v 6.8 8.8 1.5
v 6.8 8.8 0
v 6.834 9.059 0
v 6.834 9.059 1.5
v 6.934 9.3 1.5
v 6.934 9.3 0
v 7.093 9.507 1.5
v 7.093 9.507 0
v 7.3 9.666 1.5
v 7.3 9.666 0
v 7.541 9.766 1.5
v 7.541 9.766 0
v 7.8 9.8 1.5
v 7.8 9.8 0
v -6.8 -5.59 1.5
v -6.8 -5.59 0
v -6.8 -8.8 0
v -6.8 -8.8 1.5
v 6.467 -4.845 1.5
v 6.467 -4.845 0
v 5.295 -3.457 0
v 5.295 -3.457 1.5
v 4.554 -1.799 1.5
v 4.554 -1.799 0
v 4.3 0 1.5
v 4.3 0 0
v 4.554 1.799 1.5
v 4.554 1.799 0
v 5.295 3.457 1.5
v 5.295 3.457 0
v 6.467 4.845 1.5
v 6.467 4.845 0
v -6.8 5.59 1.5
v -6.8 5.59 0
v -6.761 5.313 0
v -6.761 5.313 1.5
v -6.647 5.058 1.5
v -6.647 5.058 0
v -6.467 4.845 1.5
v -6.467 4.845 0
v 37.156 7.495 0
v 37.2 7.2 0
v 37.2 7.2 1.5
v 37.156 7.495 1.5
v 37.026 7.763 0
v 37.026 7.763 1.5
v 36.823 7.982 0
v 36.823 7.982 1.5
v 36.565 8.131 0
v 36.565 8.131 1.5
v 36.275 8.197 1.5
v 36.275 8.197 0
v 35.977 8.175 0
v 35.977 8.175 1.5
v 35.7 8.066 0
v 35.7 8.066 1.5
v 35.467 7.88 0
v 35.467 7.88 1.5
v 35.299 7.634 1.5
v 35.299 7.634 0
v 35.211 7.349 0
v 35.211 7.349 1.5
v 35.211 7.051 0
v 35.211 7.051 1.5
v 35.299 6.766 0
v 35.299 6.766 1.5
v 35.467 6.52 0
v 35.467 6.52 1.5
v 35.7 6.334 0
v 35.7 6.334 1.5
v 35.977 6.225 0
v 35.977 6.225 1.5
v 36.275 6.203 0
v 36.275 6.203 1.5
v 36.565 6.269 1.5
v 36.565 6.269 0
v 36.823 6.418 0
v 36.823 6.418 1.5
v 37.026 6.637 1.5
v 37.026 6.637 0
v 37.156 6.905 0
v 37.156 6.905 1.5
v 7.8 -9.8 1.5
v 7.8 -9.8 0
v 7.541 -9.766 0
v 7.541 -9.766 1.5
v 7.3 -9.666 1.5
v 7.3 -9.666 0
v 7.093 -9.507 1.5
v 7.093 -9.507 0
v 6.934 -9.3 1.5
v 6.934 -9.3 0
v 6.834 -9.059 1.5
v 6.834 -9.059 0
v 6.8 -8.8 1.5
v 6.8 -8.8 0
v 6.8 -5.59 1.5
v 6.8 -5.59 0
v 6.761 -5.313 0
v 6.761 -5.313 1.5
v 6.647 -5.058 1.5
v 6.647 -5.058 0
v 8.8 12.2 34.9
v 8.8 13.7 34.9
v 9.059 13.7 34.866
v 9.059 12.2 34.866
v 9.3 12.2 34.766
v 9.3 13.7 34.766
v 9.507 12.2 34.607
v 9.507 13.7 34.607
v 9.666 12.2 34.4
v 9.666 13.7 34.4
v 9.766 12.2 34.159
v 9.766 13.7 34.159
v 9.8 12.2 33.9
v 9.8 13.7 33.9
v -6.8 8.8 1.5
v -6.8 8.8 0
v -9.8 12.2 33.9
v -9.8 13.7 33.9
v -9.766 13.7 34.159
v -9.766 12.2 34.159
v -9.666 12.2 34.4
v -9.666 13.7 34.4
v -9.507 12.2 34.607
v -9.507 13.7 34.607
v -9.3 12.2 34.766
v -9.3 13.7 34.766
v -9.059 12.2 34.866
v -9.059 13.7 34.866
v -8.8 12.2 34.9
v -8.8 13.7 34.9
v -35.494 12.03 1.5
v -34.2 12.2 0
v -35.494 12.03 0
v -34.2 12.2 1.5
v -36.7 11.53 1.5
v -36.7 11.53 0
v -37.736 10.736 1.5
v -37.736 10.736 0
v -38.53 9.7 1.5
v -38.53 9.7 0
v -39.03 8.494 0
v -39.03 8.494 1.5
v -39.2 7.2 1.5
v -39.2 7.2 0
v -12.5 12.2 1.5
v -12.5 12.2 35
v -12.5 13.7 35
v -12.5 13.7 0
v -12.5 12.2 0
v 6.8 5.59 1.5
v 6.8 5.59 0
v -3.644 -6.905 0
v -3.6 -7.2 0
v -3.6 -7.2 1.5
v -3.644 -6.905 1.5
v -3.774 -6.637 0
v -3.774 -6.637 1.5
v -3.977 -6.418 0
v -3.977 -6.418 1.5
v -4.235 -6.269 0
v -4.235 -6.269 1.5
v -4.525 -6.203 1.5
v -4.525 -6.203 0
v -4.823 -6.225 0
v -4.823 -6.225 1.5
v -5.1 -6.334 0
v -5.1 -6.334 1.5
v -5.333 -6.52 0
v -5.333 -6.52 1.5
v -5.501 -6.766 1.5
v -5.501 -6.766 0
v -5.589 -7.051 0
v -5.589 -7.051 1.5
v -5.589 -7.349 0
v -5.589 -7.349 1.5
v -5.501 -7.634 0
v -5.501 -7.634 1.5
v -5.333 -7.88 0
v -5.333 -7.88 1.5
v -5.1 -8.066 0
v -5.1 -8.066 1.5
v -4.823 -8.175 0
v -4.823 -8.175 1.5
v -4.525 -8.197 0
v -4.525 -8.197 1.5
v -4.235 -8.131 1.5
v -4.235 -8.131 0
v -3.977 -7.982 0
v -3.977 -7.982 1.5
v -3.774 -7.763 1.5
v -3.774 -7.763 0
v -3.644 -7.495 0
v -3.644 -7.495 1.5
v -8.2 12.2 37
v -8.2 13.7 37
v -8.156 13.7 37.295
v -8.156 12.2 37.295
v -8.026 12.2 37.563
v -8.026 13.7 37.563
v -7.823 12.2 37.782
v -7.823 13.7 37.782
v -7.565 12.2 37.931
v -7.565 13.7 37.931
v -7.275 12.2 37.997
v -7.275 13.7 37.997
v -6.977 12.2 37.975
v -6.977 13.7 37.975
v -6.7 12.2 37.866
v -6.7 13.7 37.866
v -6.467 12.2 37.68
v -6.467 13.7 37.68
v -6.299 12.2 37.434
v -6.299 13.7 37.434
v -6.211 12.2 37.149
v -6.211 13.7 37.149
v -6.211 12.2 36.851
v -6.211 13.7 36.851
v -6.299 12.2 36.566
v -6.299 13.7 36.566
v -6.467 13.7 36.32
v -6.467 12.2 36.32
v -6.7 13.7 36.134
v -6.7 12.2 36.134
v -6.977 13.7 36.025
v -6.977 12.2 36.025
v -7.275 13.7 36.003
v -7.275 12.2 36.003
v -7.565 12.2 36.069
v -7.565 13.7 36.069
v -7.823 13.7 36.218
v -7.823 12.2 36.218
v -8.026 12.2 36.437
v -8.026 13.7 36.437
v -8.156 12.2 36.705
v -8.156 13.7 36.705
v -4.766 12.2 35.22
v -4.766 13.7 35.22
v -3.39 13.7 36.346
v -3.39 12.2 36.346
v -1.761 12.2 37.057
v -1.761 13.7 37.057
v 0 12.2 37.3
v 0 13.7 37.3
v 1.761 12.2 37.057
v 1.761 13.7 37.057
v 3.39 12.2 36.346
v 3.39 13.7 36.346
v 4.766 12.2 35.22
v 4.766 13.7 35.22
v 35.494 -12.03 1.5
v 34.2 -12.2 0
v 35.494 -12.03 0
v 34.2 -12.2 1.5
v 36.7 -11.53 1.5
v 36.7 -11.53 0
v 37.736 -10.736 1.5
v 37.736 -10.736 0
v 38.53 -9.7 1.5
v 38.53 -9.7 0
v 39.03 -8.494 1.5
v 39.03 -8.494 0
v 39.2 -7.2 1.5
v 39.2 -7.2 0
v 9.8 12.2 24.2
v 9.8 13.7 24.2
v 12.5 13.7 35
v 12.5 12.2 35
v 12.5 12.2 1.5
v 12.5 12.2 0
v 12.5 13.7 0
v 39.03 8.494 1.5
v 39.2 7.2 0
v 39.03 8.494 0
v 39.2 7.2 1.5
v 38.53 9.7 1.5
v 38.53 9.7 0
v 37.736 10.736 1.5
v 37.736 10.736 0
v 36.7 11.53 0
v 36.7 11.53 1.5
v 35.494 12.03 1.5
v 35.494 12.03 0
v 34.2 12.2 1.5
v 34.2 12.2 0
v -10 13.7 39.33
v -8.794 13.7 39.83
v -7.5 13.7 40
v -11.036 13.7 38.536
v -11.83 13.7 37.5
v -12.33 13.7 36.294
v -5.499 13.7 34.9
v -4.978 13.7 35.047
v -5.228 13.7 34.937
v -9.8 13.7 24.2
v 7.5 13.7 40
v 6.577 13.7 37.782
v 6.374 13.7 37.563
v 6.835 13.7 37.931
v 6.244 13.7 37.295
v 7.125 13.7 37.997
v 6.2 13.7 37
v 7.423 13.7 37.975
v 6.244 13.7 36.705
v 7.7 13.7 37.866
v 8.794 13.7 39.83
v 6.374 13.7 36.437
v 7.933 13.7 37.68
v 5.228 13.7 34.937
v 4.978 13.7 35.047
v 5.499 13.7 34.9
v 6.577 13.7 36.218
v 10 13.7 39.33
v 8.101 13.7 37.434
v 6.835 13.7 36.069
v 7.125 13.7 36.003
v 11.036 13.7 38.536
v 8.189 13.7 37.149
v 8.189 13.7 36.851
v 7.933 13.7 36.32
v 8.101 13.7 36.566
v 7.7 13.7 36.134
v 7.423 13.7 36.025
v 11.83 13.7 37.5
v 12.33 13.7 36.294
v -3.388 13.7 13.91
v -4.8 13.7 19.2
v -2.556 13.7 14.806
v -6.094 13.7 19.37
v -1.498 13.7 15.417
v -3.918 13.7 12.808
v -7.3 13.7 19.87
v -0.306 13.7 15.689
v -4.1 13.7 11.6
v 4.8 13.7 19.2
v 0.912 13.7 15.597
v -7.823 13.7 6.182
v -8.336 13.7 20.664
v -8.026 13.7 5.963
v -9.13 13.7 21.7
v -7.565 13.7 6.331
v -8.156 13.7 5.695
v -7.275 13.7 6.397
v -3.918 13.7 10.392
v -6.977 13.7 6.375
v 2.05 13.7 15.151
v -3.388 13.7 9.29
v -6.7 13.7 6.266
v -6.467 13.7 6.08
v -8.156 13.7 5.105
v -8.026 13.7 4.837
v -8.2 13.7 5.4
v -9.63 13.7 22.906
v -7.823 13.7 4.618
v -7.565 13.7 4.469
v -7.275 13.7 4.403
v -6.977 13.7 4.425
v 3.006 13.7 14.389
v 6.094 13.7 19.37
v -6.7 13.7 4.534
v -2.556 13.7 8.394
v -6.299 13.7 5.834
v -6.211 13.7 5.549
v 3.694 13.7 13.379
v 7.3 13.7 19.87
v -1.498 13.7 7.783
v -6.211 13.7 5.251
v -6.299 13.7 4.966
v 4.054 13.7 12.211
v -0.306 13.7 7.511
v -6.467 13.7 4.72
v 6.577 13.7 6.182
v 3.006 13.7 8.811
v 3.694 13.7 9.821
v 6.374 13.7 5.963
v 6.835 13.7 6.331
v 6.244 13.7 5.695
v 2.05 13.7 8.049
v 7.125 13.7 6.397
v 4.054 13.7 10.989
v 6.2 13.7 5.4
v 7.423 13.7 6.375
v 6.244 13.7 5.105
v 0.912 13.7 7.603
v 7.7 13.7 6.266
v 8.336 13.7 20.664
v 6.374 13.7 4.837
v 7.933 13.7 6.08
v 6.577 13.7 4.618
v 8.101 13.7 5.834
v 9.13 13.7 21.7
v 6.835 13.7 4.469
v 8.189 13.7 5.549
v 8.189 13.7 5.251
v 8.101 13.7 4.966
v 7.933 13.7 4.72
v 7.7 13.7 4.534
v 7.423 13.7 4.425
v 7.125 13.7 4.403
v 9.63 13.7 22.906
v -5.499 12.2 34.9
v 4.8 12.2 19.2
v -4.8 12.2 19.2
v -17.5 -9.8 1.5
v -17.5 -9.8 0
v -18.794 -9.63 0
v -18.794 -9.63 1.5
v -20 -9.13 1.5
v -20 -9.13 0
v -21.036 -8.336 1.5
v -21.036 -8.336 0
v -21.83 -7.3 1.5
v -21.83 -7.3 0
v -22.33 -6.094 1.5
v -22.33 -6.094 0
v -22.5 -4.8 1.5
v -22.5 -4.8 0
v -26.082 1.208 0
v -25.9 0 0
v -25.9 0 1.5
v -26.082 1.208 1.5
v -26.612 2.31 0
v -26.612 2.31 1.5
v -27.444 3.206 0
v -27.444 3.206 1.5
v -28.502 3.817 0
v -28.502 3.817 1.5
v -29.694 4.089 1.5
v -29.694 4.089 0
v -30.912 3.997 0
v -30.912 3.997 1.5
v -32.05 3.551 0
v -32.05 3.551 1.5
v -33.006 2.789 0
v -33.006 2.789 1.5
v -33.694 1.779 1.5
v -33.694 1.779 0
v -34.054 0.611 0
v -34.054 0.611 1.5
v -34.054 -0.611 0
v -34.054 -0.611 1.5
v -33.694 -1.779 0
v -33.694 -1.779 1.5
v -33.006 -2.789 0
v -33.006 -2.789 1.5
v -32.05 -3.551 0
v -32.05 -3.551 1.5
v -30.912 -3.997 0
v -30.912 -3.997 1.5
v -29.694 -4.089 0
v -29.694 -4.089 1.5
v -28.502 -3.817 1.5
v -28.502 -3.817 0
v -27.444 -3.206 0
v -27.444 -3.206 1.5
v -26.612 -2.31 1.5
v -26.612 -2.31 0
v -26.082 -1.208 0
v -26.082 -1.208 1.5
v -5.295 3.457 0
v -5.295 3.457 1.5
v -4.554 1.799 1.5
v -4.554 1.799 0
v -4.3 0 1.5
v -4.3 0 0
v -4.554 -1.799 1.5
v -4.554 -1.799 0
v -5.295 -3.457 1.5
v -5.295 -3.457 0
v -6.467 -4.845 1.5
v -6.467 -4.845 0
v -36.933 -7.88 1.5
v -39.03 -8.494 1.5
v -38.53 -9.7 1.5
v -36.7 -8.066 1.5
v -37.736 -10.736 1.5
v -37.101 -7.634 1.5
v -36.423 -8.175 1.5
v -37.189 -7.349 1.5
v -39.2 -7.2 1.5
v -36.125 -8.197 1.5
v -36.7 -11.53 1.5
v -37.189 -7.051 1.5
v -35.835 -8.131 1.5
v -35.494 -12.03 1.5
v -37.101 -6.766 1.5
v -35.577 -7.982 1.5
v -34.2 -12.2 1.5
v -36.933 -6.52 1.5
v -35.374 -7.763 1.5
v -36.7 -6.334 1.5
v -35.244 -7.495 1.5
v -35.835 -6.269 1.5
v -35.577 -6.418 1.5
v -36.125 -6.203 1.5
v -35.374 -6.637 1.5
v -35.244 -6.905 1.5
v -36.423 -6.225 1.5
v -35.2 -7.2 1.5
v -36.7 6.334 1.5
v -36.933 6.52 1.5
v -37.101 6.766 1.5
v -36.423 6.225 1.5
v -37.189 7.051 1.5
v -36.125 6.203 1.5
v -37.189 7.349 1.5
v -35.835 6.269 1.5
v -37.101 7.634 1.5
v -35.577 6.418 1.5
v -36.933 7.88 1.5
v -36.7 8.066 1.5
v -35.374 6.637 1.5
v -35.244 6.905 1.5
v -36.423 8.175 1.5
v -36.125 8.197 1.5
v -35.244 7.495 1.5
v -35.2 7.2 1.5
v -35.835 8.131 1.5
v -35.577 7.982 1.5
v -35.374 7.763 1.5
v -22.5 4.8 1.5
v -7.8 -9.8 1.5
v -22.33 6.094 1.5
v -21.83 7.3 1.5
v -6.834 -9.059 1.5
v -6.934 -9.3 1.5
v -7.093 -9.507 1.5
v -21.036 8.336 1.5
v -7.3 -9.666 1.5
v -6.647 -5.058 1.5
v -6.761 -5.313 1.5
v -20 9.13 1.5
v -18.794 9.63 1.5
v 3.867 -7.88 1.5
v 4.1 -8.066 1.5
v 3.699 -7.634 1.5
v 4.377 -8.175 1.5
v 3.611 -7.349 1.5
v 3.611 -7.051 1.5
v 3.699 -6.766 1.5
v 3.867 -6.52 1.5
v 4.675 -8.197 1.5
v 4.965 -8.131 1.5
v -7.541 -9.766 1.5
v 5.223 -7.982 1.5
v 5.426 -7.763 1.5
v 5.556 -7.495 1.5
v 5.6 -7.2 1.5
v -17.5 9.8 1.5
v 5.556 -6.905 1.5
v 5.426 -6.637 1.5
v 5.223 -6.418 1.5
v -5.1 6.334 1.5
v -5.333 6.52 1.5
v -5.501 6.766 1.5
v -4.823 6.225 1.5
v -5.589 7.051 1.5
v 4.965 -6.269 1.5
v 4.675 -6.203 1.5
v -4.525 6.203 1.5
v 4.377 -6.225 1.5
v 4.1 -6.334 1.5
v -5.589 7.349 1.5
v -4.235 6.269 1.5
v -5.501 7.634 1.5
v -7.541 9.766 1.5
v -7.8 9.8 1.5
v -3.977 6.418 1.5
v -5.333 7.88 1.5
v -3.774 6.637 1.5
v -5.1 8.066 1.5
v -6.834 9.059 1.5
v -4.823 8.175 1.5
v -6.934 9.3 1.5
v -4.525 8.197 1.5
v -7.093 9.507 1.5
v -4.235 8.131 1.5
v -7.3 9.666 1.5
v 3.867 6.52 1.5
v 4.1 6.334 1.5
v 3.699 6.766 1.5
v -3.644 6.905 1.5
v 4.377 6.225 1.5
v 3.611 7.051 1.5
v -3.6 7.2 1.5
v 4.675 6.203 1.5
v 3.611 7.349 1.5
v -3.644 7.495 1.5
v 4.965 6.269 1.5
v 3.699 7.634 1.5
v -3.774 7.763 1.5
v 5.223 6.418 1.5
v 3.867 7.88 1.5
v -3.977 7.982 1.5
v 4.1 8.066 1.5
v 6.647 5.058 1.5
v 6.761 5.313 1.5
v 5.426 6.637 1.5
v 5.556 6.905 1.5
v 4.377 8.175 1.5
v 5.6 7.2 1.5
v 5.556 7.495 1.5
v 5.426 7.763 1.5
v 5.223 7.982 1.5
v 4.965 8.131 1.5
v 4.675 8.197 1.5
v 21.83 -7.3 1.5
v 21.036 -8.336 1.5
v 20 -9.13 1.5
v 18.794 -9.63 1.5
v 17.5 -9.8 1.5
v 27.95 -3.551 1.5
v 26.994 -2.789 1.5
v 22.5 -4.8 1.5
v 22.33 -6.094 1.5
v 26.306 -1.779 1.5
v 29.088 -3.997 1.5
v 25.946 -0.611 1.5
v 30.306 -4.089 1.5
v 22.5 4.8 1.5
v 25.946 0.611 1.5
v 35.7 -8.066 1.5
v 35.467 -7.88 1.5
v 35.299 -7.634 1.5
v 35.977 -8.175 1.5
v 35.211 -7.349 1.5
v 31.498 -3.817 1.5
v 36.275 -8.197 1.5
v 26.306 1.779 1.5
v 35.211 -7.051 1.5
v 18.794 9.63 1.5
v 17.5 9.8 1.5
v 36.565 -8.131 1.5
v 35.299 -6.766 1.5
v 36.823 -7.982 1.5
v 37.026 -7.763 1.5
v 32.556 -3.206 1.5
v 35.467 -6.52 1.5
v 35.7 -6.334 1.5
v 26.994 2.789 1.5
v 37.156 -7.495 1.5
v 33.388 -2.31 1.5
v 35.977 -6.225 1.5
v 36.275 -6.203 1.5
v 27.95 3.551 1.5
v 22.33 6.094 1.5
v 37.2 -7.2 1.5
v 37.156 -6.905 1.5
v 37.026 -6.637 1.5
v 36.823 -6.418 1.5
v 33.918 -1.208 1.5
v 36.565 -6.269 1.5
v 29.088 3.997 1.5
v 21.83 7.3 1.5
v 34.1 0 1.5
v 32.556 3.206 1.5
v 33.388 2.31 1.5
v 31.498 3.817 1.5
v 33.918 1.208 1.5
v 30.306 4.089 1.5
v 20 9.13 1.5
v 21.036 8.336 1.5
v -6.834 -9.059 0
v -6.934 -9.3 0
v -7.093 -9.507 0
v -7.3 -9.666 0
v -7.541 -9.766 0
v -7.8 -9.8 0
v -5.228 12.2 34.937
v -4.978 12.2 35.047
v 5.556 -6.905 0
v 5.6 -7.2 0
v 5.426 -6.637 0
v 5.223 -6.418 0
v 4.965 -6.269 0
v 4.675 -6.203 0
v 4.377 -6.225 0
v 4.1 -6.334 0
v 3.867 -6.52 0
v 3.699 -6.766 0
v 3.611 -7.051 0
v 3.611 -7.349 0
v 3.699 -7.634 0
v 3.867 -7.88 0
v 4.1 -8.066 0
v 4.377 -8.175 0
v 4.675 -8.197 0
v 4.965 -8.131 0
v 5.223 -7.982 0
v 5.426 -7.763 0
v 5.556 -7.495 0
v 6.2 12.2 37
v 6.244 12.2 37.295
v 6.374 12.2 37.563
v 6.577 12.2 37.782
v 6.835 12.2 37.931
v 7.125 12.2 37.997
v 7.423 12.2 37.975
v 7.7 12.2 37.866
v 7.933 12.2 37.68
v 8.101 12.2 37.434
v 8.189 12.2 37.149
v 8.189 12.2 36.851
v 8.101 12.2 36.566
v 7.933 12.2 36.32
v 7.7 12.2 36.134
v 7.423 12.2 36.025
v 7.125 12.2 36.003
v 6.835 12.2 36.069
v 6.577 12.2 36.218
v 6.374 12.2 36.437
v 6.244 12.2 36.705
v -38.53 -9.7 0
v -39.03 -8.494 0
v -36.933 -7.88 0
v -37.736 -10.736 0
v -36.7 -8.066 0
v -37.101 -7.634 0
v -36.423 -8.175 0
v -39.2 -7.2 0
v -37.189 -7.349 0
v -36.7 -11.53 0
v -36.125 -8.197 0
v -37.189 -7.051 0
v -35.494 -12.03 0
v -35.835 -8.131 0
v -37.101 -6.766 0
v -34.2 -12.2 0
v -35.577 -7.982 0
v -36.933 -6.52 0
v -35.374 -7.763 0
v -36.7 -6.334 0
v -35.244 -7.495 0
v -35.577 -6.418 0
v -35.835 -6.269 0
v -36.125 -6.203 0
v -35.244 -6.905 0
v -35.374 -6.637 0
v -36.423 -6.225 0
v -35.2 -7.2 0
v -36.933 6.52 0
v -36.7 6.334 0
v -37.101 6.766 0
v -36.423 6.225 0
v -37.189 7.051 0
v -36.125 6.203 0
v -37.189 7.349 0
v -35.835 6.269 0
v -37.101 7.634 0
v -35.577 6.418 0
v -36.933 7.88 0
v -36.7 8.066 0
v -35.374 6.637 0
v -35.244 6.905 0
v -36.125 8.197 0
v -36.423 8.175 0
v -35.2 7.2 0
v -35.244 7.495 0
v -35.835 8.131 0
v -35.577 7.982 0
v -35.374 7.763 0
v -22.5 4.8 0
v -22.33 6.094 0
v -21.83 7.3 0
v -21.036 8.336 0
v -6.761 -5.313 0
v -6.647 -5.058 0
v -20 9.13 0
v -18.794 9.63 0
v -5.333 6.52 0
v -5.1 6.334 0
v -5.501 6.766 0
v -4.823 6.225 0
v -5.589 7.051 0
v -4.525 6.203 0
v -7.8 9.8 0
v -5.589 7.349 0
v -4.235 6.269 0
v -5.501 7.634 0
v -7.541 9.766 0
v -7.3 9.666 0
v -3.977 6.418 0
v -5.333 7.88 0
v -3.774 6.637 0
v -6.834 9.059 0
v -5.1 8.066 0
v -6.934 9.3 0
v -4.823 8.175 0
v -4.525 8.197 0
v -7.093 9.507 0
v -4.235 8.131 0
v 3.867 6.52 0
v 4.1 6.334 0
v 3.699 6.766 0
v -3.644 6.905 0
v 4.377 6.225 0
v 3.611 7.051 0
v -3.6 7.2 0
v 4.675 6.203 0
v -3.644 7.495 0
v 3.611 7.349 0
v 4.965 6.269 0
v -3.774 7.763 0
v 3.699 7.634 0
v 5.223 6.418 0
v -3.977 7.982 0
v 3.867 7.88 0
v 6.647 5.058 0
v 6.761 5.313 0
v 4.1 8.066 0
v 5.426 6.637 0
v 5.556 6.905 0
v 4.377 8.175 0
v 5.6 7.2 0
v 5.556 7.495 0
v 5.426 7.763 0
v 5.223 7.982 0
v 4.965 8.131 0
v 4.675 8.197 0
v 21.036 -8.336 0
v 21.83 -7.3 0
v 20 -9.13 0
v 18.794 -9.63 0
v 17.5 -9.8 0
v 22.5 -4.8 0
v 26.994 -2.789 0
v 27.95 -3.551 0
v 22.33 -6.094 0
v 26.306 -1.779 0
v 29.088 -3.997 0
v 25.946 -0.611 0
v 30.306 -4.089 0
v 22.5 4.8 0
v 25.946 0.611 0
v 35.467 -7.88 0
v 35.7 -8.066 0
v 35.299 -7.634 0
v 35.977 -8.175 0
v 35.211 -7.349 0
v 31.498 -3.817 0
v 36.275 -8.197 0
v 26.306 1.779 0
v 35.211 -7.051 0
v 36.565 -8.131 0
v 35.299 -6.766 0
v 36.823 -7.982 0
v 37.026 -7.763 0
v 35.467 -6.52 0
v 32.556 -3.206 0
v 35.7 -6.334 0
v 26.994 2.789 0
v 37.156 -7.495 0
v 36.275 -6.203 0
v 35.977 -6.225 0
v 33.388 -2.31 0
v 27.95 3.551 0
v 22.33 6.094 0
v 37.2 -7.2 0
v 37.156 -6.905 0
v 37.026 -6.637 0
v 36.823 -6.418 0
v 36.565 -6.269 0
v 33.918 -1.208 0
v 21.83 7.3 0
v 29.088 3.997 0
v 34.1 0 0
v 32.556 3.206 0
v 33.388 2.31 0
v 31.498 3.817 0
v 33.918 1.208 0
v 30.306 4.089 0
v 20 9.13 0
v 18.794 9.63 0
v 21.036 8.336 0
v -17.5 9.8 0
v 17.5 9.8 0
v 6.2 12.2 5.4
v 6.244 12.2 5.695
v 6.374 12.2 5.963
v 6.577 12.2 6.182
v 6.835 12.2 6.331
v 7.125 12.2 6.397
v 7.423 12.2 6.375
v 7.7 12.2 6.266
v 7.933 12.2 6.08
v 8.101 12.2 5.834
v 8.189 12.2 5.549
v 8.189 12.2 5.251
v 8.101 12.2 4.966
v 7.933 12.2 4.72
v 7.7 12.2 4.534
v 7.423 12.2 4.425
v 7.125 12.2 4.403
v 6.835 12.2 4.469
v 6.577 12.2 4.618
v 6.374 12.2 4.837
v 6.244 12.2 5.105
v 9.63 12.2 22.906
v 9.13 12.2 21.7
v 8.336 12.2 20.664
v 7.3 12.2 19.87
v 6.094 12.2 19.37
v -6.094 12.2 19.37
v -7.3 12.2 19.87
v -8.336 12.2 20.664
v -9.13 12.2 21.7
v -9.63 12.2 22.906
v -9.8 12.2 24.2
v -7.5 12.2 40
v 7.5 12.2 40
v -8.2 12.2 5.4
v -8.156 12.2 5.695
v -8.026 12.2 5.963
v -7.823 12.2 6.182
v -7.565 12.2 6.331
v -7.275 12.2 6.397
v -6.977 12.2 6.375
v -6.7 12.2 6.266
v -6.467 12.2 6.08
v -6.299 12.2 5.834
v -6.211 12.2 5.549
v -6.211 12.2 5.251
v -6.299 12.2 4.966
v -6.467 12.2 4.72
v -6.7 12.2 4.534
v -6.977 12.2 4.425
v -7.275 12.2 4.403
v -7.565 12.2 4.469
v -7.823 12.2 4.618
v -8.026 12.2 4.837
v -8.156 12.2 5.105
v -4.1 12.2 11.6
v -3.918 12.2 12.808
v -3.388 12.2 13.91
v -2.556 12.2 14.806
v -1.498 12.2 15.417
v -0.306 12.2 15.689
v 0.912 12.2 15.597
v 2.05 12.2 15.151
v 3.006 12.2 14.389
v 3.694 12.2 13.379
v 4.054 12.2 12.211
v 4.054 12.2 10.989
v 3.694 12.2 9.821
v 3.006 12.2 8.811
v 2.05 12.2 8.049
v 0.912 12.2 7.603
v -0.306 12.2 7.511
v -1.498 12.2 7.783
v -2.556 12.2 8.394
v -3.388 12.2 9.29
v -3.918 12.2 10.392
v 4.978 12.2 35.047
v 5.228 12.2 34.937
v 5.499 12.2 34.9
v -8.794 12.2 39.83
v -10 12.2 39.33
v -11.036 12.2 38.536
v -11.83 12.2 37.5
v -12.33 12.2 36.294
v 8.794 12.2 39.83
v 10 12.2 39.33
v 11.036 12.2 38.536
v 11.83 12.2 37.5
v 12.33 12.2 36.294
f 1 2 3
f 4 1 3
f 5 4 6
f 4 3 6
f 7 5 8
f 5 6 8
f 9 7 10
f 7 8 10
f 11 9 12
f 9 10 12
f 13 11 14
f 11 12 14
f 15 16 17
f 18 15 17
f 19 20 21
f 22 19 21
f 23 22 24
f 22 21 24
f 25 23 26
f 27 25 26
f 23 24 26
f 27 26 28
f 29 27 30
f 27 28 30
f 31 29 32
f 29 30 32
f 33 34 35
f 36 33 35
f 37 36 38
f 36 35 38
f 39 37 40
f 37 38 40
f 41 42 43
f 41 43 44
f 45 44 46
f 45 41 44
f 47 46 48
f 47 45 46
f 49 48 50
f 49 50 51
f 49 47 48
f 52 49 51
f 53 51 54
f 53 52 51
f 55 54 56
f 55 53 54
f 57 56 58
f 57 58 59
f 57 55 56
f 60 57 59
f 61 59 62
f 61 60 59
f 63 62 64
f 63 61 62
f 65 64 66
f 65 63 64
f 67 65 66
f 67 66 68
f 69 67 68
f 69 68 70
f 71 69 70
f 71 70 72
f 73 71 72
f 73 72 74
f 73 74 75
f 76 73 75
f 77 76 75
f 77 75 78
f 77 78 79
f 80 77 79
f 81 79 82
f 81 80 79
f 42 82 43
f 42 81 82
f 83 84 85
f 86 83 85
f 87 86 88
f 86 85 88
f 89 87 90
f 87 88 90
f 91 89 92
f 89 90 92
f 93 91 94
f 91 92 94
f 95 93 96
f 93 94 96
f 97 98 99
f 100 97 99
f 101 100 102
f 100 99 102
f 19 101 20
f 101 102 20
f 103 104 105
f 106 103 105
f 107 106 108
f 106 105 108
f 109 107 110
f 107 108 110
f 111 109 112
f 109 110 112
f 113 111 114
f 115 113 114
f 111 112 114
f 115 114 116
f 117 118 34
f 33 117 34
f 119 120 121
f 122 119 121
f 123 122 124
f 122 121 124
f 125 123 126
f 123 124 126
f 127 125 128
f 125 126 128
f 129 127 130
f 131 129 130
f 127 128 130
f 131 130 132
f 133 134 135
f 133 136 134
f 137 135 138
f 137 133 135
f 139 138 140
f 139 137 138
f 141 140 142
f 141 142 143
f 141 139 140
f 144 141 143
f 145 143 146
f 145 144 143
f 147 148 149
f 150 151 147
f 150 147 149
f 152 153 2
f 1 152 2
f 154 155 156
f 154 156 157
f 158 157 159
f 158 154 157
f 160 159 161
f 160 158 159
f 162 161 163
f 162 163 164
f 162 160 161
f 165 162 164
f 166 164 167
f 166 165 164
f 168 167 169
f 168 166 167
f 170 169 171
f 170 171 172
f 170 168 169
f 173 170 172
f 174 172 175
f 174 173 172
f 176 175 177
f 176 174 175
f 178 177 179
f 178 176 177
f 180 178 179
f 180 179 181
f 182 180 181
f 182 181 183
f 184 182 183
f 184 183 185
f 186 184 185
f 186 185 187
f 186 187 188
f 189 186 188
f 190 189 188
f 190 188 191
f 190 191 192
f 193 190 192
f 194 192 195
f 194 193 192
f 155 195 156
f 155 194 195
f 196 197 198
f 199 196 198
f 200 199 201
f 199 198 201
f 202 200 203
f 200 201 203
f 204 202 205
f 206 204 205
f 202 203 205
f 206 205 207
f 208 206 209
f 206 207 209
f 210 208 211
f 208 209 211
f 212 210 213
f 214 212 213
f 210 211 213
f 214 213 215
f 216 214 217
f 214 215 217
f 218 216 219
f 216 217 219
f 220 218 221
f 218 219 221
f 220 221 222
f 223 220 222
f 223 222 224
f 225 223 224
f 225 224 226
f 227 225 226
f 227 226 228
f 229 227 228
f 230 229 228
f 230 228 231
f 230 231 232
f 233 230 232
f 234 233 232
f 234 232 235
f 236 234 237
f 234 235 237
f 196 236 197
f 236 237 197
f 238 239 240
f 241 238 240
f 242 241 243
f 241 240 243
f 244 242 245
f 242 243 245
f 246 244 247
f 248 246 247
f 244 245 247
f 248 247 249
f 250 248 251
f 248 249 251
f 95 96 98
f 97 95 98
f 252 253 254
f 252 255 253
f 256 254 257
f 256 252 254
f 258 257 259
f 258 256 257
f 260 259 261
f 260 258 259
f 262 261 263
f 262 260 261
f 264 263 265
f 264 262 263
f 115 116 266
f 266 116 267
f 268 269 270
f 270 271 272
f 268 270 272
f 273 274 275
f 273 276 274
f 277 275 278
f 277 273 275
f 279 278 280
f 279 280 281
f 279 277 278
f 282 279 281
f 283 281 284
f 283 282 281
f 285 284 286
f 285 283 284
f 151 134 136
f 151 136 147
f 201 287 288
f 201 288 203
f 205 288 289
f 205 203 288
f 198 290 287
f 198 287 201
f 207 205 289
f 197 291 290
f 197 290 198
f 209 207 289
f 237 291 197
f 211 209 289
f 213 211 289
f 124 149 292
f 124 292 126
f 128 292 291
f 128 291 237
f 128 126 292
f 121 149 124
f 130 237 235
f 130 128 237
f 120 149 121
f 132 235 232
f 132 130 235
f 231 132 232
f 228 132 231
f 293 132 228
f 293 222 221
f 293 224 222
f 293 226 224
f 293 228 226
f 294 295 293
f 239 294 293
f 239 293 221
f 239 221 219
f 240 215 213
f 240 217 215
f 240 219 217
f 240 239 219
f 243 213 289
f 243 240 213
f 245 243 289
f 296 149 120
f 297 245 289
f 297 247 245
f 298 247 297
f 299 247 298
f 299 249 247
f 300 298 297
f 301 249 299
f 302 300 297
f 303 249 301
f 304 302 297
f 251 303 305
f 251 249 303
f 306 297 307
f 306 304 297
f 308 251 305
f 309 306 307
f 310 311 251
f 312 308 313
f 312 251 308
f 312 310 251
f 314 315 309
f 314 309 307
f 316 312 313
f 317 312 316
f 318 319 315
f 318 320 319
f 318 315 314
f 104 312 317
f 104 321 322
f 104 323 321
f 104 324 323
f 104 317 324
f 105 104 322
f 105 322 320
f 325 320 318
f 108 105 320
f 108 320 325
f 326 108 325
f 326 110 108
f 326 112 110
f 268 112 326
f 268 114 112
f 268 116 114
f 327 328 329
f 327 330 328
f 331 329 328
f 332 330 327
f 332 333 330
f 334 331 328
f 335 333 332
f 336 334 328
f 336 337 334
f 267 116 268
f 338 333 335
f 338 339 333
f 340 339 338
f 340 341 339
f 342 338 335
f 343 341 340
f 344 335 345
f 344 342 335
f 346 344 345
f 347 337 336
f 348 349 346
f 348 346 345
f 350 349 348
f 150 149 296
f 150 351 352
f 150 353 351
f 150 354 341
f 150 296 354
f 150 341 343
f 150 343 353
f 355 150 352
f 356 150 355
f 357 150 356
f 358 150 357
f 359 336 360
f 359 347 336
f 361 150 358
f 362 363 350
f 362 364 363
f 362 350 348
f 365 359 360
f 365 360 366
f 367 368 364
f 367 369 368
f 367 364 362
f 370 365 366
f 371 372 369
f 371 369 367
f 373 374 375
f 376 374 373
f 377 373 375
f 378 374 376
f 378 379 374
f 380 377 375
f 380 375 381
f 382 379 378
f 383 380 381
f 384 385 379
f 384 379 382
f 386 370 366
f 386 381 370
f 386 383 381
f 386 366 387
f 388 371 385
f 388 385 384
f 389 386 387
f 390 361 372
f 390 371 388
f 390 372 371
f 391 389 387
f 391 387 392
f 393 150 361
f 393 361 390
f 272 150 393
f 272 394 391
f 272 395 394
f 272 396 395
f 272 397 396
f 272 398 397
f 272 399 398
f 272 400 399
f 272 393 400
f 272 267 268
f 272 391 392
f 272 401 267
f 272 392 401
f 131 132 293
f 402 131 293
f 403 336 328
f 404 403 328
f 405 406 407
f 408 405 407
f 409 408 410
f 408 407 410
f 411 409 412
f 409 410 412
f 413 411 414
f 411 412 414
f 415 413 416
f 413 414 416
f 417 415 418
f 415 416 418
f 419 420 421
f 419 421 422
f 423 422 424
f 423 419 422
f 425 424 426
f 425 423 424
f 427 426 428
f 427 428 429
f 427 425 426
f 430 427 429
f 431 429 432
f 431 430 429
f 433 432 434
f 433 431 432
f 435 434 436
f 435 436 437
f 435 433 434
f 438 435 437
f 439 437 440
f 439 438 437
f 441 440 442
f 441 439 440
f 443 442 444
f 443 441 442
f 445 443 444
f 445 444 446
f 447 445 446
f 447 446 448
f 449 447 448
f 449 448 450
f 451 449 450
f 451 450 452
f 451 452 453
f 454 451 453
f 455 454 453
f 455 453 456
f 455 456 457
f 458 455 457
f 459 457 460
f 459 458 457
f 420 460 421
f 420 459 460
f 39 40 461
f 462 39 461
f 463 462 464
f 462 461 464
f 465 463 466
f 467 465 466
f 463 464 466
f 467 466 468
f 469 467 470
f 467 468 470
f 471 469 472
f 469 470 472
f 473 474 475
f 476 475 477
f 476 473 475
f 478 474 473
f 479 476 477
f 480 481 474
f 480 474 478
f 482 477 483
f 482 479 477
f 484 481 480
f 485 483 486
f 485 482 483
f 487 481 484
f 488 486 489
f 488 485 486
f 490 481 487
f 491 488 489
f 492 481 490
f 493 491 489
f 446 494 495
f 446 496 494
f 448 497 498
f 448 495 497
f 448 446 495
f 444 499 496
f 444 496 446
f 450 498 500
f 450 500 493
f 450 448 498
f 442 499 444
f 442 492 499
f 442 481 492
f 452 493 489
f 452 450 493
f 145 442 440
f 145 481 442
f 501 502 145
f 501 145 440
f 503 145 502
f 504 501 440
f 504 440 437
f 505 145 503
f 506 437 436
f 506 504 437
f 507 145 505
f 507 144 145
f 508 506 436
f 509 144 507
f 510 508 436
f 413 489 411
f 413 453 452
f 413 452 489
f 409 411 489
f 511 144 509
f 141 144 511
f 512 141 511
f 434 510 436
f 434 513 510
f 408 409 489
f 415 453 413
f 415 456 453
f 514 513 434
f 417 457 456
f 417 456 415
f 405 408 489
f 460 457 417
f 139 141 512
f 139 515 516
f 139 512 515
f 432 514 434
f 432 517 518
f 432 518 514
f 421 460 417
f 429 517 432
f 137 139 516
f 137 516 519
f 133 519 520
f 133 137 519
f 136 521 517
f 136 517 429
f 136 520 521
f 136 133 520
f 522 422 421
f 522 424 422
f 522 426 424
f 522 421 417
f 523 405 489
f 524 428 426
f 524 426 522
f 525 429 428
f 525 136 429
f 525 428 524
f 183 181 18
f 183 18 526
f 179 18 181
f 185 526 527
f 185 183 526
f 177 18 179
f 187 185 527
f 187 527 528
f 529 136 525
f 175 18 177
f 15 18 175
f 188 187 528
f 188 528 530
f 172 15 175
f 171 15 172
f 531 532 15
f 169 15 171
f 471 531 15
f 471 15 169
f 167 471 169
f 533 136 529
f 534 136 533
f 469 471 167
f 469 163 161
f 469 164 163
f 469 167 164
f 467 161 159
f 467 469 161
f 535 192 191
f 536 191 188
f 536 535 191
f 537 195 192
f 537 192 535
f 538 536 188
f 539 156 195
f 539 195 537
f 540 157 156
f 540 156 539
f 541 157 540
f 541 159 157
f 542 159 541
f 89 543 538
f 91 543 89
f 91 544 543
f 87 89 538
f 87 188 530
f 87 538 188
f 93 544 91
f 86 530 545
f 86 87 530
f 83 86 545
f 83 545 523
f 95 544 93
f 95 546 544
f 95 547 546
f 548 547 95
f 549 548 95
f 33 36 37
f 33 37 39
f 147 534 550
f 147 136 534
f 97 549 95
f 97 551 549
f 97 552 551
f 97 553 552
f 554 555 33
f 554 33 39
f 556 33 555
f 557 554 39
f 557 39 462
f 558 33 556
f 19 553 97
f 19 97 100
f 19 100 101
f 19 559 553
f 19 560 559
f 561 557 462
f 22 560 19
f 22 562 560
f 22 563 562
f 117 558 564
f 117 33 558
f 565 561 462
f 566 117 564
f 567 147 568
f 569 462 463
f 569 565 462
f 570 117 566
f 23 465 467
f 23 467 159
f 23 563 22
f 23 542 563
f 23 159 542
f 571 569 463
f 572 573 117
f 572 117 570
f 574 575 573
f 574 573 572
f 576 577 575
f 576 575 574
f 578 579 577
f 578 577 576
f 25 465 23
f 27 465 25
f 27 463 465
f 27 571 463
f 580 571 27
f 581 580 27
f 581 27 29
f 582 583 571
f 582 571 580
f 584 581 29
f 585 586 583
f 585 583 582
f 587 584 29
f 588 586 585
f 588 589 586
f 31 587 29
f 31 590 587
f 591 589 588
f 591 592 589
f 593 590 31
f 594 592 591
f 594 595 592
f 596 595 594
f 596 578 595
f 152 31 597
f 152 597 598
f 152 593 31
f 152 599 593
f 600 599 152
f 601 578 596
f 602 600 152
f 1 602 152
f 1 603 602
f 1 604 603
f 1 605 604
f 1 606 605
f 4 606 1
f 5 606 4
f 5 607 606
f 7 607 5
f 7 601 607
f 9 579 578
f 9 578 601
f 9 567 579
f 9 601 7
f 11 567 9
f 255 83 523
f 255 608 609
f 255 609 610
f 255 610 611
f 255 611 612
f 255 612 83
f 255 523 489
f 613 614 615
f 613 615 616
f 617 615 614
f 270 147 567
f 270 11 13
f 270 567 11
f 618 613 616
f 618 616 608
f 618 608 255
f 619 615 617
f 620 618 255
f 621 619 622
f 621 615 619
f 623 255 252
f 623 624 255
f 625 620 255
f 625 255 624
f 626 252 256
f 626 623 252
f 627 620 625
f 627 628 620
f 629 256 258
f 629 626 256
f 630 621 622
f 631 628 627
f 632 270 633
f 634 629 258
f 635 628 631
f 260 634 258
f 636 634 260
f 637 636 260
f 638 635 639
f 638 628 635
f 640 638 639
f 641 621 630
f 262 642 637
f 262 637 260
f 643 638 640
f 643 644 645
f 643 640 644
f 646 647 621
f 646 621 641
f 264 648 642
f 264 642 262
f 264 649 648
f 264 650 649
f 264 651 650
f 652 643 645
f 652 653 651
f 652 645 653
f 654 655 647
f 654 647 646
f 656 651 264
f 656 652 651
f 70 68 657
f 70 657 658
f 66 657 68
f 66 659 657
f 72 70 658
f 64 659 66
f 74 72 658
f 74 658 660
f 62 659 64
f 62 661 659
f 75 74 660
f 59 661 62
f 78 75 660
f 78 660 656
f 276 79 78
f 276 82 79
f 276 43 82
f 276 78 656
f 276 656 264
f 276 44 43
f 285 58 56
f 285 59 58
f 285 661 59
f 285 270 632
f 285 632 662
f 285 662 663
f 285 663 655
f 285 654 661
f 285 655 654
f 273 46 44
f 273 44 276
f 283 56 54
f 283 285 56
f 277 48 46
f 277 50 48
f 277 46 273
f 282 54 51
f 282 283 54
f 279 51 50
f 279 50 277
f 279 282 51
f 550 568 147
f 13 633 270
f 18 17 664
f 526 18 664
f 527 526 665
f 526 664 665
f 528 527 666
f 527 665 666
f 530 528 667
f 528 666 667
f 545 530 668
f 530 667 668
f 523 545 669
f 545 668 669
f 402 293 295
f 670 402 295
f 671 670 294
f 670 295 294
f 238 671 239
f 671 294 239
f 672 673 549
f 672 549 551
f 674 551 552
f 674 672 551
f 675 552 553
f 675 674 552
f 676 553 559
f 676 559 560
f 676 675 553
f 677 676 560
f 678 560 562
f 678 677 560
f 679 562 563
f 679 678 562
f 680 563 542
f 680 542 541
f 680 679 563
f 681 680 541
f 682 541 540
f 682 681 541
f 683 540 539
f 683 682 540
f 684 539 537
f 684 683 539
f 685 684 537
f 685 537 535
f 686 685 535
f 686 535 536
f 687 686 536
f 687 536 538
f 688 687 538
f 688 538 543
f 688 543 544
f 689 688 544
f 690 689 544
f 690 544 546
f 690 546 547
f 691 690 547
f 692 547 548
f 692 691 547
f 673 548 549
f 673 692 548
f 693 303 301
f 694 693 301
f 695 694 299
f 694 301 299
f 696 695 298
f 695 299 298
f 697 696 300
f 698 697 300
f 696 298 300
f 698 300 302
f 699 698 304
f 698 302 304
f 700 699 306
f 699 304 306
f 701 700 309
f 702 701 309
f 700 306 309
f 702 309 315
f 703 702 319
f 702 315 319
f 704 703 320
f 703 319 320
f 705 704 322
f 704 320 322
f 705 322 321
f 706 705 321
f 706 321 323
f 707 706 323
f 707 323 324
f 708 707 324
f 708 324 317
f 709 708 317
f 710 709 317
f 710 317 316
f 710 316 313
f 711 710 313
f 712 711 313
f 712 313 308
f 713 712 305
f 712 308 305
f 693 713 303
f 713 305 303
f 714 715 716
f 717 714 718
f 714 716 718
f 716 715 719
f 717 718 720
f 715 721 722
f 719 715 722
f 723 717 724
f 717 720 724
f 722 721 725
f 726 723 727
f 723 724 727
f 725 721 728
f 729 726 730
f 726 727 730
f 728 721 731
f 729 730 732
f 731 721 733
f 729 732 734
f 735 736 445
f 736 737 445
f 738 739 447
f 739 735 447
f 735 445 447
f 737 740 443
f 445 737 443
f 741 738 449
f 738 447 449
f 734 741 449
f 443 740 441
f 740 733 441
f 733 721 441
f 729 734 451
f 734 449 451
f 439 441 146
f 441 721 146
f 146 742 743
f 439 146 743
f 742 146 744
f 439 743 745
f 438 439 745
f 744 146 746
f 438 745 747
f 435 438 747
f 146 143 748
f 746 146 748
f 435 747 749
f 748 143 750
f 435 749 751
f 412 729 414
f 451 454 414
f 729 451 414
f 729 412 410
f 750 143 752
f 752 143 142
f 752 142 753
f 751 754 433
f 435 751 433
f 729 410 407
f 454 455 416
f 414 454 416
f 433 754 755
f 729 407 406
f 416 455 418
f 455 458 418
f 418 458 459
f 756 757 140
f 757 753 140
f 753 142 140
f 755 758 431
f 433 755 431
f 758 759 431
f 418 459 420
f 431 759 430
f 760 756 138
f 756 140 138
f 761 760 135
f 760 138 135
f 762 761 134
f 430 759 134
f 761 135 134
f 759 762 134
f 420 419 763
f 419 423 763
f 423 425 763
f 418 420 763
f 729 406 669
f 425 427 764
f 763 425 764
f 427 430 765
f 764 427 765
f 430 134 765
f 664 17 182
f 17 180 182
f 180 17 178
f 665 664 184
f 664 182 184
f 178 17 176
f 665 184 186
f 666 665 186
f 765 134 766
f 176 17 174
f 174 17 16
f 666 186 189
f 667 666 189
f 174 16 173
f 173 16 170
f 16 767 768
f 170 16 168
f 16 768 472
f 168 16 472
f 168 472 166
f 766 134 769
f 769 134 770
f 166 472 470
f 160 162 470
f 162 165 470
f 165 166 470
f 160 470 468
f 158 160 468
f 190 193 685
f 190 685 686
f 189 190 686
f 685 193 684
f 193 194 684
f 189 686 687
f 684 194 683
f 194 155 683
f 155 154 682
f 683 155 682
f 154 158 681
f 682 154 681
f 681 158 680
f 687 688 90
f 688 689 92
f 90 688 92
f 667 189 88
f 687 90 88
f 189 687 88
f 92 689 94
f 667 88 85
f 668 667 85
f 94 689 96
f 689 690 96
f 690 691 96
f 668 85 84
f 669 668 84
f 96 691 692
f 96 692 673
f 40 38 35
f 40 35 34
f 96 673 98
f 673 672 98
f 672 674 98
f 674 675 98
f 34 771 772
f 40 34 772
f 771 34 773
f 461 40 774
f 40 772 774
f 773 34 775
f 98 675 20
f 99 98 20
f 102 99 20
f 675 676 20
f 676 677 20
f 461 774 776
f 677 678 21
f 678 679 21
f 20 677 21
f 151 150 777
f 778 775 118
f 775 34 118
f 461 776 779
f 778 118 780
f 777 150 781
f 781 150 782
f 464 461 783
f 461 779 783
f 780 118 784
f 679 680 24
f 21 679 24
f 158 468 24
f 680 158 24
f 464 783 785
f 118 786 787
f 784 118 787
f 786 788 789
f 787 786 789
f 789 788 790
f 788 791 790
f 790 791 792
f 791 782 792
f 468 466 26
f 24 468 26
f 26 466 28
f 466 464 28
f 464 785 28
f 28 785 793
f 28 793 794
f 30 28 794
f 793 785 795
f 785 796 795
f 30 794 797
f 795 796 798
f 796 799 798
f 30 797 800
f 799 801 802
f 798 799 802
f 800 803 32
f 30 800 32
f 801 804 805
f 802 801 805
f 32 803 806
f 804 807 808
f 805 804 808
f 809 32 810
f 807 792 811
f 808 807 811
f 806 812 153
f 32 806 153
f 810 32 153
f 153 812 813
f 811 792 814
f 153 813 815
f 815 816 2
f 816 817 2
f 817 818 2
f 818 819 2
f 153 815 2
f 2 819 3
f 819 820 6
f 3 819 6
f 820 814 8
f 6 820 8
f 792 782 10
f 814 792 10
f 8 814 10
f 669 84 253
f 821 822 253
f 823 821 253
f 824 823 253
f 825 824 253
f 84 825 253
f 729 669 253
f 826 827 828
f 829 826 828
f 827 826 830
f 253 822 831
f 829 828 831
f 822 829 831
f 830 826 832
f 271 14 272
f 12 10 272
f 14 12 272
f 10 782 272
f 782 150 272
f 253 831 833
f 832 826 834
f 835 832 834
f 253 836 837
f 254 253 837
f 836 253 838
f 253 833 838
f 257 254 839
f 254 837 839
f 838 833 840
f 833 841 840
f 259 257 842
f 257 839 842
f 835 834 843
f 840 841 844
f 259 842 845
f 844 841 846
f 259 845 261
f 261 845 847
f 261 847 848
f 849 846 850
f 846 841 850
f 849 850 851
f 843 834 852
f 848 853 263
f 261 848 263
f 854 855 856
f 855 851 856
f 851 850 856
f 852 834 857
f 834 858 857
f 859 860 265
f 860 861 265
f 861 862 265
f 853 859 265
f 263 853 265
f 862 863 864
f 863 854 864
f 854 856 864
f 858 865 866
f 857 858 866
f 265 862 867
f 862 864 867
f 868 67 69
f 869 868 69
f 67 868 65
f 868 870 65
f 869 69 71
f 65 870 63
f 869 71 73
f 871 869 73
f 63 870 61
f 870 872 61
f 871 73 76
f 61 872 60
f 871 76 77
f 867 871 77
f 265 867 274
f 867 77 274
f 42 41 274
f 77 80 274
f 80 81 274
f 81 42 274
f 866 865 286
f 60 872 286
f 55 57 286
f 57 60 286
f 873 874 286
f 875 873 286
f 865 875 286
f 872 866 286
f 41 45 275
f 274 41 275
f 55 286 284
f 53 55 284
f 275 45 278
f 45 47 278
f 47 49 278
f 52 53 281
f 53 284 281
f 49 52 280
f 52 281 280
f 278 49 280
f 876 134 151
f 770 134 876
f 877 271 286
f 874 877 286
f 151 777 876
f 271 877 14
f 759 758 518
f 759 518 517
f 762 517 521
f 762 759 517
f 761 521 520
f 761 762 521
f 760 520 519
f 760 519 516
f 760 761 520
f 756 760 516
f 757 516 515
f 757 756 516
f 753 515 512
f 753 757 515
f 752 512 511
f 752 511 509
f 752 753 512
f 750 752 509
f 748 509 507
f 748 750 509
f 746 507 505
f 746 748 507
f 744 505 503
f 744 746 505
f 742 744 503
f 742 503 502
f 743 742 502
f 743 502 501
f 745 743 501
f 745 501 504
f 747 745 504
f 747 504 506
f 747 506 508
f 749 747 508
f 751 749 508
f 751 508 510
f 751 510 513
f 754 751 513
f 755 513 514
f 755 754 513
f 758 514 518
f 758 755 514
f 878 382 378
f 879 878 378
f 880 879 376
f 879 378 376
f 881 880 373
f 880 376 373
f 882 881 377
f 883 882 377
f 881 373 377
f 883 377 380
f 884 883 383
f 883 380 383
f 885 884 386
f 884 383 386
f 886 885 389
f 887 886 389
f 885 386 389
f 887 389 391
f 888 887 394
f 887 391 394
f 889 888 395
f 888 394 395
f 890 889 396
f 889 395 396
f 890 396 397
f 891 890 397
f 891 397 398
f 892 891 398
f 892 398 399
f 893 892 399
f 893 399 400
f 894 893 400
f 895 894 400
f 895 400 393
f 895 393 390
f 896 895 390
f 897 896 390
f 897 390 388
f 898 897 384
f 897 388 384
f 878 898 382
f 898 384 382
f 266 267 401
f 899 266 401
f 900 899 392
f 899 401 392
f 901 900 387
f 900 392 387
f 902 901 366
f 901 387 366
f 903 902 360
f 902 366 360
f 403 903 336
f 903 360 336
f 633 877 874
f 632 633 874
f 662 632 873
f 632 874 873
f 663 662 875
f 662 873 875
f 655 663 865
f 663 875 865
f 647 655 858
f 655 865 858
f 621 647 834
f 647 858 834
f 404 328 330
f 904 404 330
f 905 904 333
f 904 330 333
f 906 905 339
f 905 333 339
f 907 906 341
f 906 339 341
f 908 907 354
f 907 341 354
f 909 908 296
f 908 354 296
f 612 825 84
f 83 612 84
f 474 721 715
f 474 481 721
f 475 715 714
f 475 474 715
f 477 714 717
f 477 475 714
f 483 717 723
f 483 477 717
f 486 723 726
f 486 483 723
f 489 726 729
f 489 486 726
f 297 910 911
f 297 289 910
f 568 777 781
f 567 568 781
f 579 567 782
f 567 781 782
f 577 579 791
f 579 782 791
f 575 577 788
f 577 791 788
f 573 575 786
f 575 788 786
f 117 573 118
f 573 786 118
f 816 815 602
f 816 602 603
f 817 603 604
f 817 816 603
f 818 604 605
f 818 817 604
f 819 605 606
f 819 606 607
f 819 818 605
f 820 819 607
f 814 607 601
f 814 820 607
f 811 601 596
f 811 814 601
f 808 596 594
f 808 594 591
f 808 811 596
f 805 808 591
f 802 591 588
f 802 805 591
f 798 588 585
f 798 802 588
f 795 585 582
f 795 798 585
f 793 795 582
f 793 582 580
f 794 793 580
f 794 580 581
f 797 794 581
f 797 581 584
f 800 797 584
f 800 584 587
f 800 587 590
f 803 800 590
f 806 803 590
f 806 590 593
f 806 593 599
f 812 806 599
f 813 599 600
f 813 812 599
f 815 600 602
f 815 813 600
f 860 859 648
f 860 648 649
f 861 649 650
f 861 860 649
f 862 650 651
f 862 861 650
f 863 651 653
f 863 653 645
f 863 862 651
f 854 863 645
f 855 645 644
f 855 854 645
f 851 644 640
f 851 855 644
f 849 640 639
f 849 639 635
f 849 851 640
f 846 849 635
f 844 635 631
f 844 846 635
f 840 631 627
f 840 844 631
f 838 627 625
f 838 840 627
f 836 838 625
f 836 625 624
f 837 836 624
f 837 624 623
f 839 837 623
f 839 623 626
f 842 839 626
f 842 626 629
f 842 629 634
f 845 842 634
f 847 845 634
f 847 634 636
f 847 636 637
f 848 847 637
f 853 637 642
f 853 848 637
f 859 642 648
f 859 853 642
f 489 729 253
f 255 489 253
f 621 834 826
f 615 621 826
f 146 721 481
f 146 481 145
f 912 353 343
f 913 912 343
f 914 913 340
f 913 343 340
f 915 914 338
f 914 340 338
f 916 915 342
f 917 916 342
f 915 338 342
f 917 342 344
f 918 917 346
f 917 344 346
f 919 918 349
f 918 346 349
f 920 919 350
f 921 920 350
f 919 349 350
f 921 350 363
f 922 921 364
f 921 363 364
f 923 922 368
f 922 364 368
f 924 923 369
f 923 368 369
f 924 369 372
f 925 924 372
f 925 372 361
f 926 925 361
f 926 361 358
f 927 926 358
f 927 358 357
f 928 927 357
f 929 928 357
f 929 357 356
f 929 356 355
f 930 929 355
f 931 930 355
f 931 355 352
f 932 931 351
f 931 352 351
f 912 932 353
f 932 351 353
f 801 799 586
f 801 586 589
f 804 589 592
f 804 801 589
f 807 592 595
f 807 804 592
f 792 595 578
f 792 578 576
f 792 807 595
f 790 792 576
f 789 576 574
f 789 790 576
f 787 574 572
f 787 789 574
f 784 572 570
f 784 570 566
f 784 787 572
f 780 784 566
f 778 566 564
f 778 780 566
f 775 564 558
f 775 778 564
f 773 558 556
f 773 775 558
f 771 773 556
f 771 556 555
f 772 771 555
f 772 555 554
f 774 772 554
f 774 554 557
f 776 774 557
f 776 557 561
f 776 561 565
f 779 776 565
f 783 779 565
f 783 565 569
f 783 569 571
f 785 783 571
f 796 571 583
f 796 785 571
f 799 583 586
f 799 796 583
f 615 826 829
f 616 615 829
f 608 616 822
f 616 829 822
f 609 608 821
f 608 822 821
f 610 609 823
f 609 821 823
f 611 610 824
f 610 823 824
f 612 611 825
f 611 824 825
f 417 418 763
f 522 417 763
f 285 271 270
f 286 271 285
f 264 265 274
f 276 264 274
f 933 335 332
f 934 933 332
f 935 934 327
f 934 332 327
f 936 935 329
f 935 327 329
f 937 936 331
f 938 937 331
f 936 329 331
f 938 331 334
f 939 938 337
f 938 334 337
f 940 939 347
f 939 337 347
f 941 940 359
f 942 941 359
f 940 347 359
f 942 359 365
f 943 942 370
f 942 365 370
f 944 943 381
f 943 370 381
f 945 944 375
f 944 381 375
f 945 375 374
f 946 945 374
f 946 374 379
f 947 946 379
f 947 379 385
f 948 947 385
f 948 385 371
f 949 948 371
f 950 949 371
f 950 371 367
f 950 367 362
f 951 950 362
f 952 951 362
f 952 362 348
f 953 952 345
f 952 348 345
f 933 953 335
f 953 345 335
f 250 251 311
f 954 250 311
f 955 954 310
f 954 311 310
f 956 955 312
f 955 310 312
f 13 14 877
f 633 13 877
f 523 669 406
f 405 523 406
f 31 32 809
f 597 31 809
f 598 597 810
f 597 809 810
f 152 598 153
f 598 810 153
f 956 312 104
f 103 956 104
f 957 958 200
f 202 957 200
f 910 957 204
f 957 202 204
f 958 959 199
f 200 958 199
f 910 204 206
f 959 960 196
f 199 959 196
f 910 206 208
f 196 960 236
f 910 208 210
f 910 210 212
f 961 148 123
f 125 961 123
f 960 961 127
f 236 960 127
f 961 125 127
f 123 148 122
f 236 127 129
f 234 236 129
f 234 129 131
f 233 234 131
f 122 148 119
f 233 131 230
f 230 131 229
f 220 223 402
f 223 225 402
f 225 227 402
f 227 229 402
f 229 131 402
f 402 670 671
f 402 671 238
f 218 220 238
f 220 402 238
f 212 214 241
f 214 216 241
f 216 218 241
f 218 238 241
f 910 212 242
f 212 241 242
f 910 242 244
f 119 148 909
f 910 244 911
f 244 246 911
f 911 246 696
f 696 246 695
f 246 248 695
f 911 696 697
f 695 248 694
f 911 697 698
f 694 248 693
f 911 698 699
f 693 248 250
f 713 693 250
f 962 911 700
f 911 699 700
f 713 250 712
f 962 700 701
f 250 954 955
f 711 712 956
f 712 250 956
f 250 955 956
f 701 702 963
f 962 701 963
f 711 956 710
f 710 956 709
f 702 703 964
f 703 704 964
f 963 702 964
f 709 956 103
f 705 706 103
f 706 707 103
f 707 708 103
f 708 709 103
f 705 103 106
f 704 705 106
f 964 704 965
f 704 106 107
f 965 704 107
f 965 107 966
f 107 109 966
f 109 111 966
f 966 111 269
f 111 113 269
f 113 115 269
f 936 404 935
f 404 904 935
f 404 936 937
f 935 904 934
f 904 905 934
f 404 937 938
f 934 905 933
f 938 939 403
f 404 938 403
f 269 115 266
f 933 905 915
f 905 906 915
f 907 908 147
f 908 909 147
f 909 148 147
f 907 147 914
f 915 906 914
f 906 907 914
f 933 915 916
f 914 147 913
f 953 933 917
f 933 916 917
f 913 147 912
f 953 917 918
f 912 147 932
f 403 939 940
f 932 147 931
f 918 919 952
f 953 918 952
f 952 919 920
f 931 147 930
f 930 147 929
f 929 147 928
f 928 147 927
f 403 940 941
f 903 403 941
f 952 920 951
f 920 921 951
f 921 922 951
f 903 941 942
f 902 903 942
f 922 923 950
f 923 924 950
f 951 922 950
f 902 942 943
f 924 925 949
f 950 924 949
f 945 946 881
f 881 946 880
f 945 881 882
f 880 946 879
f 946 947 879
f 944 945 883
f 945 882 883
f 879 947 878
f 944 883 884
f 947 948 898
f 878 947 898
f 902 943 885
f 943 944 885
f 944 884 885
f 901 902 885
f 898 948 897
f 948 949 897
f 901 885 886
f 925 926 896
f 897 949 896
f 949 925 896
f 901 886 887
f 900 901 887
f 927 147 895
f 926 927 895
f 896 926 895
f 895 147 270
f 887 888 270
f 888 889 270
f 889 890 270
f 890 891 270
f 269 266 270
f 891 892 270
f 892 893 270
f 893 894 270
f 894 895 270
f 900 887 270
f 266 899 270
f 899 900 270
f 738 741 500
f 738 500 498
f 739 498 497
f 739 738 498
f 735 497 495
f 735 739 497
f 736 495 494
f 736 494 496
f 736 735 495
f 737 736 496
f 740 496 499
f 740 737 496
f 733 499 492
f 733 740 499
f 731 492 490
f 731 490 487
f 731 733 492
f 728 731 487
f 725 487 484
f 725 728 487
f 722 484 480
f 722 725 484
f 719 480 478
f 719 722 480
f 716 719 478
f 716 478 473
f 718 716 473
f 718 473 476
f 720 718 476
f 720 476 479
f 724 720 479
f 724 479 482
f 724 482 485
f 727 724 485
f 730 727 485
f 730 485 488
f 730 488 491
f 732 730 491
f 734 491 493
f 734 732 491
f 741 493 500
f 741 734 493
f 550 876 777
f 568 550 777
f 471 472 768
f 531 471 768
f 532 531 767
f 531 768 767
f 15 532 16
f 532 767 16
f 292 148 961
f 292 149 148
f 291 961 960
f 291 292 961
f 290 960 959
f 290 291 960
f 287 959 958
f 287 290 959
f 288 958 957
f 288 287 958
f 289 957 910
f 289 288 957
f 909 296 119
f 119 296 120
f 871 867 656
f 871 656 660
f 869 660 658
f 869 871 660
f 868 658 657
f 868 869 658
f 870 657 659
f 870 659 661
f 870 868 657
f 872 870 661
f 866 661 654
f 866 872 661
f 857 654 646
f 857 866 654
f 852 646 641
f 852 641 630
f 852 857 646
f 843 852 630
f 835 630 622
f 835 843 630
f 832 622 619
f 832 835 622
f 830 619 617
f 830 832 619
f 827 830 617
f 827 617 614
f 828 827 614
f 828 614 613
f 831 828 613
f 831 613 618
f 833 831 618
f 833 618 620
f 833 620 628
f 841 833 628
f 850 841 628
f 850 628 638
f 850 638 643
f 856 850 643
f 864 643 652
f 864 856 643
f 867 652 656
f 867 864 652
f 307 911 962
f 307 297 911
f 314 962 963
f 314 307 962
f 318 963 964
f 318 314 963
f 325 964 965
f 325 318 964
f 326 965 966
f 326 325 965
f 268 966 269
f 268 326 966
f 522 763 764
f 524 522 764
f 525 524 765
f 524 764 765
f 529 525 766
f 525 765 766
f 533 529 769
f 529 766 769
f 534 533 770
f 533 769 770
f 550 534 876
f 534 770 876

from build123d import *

# Parameters (mm, degrees)
F0_W     = 78.4
F0_H     = 24.4
F0_R     = 1
F0_R_2   = 4.1
F1_DEPTH = 1.5
F2_W     = 25
F2_H     = 1.5
F3_DEPTH = 40
F4_R     = 1
F4_R_2   = 4.1
F5_DEPTH = 1.5
F6_R     = 5


with BuildPart() as f1:
    # F0 (on Top) → F1 (new body)
    with BuildSketch(Plane.XY):
        Rectangle(F0_W, F0_H)
        with Locations((-36.2, -7.2)):
            Circle(F0_R, mode=Mode.SUBTRACT)
        with Locations((-4.6, -7.2)):
            Circle(F0_R, mode=Mode.SUBTRACT)
        with Locations((4.6, -7.2)):
            Circle(F0_R, mode=Mode.SUBTRACT)
        with Locations((36.2, -7.2)):
            Circle(F0_R, mode=Mode.SUBTRACT)
        with Locations((-30, 0)):
            Circle(F0_R_2, mode=Mode.SUBTRACT)
        with BuildLine():
            ThreePointArc((-22.5, 4.8), (-21.035534, 8.335534), (-17.5, 9.8))
            Line((-17.5, 9.8), (-7.8, 9.8))
            ThreePointArc((-7.8, 9.8), (-7.092893, 9.507107), (-6.8, 8.8))
            Line((-6.8, 8.8), (-6.8, 5.59017))
            ThreePointArc((-6.8, 5.59017), (-6.712871, 5.181922), (-6.466667, 4.844814))
            ThreePointArc((-6.466667, 4.844814), (-4.3, 0), (-6.466667, -4.844814))
            ThreePointArc((-6.466667, -4.844814), (-6.712871, -5.181922), (-6.8, -5.59017))
            Line((-6.8, -5.59017), (-6.8, -8.8))
            ThreePointArc((-6.8, -8.8), (-7.092893, -9.507107), (-7.8, -9.8))
            Line((-7.8, -9.8), (-17.5, -9.8))
            ThreePointArc((-17.5, -9.8), (-21.035534, -8.335534), (-22.5, -4.8))
            Line((-22.5, -4.8), (-22.5, 4.8))
        make_face(mode=Mode.SUBTRACT)
        with Locations((-36.2, 7.2)):
            Circle(F0_R, mode=Mode.SUBTRACT)
        with Locations((-4.6, 7.2)):
            Circle(F0_R, mode=Mode.SUBTRACT)
        with BuildLine():
            Line((6.8, 5.59017), (6.8, 8.8))
            ThreePointArc((6.8, 8.8), (7.092893, 9.507107), (7.8, 9.8))
            Line((7.8, 9.8), (17.5, 9.8))
            ThreePointArc((17.5, 9.8), (21.035534, 8.335534), (22.5, 4.8))
            Line((22.5, 4.8), (22.5, -4.8))
            ThreePointArc((22.5, -4.8), (21.035534, -8.335534), (17.5, -9.8))
            Line((17.5, -9.8), (7.8, -9.8))
            ThreePointArc((7.8, -9.8), (7.092893, -9.507107), (6.8, -8.8))
            Line((6.8, -8.8), (6.8, -5.59017))
            ThreePointArc((6.8, -5.59017), (6.712871, -5.181922), (6.466667, -4.844814))
            ThreePointArc((6.466667, -4.844814), (4.3, 0), (6.466667, 4.844814))
            ThreePointArc((6.466667, 4.844814), (6.712871, 5.181922), (6.8, 5.59017))
        make_face(mode=Mode.SUBTRACT)
        with Locations((30, 0)):
            Circle(F0_R_2, mode=Mode.SUBTRACT)
        with Locations((4.6, 7.2)):
            Circle(F0_R, mode=Mode.SUBTRACT)
        with Locations((36.2, 7.2)):
            Circle(F0_R, mode=Mode.SUBTRACT)
    extrude(amount=F1_DEPTH)

    # F2 (on Top) → F3 (join)
    with BuildSketch(Plane.XY):
        with Locations((0, 12.95)):
            Rectangle(F2_W, F2_H)
    extrude(amount=F3_DEPTH)

    # F4 (on face) → F5 (cut, through all)
    with BuildSketch(Plane(origin=(0, 13.7, 0), x_dir=(-1, 0, 0), z_dir=(0, 1, 0))):
        with Locations((7.2, 37)):
            Circle(F4_R)
        with Locations((7.2, 5.4)):
            Circle(F4_R)
        with Locations((0, 11.6)):
            Circle(F4_R_2)
        with BuildLine():
            ThreePointArc((9.8, 33.9), (9.507107, 34.607107), (8.8, 34.9))
            Line((8.8, 34.9), (5.499091, 34.9))
            ThreePointArc((5.499091, 34.9), (5.099091, 34.983485), (4.765879, 35.22))
            ThreePointArc((4.765879, 35.22), (0, 37.3), (-4.765879, 35.22))
            ThreePointArc((-4.765879, 35.22), (-5.099091, 34.983485), (-5.499091, 34.9))
            Line((-5.499091, 34.9), (-8.8, 34.9))
            ThreePointArc((-8.8, 34.9), (-9.507107, 34.607107), (-9.8, 33.9))
            Line((-9.8, 33.9), (-9.8, 24.2))
            ThreePointArc((-9.8, 24.2), (-8.335534, 20.664466), (-4.8, 19.2))
            Line((-4.8, 19.2), (4.8, 19.2))
            ThreePointArc((4.8, 19.2), (8.335534, 20.664466), (9.8, 24.2))
            Line((9.8, 24.2), (9.8, 33.9))
        make_face()
        with Locations((-7.2, 37)):
            Circle(F4_R)
        with Locations((-7.2, 5.4)):
            Circle(F4_R)
    extrude(amount=-F5_DEPTH, mode=Mode.SUBTRACT)

    # F6
    f6_edges = [f1.edges().sort_by_distance(p)[0] for p in [
        (-39.2, 12.2, 0.75),
        (-39.2, -12.2, 0.75),
        (39.2, 12.2, 0.75),
        (39.2, -12.2, 0.75),
        (-12.5, 12.95, 40),
        (12.5, 12.95, 40),
    ]]
    fillet(f6_edges, radius=F6_R)


solid = f1.part
